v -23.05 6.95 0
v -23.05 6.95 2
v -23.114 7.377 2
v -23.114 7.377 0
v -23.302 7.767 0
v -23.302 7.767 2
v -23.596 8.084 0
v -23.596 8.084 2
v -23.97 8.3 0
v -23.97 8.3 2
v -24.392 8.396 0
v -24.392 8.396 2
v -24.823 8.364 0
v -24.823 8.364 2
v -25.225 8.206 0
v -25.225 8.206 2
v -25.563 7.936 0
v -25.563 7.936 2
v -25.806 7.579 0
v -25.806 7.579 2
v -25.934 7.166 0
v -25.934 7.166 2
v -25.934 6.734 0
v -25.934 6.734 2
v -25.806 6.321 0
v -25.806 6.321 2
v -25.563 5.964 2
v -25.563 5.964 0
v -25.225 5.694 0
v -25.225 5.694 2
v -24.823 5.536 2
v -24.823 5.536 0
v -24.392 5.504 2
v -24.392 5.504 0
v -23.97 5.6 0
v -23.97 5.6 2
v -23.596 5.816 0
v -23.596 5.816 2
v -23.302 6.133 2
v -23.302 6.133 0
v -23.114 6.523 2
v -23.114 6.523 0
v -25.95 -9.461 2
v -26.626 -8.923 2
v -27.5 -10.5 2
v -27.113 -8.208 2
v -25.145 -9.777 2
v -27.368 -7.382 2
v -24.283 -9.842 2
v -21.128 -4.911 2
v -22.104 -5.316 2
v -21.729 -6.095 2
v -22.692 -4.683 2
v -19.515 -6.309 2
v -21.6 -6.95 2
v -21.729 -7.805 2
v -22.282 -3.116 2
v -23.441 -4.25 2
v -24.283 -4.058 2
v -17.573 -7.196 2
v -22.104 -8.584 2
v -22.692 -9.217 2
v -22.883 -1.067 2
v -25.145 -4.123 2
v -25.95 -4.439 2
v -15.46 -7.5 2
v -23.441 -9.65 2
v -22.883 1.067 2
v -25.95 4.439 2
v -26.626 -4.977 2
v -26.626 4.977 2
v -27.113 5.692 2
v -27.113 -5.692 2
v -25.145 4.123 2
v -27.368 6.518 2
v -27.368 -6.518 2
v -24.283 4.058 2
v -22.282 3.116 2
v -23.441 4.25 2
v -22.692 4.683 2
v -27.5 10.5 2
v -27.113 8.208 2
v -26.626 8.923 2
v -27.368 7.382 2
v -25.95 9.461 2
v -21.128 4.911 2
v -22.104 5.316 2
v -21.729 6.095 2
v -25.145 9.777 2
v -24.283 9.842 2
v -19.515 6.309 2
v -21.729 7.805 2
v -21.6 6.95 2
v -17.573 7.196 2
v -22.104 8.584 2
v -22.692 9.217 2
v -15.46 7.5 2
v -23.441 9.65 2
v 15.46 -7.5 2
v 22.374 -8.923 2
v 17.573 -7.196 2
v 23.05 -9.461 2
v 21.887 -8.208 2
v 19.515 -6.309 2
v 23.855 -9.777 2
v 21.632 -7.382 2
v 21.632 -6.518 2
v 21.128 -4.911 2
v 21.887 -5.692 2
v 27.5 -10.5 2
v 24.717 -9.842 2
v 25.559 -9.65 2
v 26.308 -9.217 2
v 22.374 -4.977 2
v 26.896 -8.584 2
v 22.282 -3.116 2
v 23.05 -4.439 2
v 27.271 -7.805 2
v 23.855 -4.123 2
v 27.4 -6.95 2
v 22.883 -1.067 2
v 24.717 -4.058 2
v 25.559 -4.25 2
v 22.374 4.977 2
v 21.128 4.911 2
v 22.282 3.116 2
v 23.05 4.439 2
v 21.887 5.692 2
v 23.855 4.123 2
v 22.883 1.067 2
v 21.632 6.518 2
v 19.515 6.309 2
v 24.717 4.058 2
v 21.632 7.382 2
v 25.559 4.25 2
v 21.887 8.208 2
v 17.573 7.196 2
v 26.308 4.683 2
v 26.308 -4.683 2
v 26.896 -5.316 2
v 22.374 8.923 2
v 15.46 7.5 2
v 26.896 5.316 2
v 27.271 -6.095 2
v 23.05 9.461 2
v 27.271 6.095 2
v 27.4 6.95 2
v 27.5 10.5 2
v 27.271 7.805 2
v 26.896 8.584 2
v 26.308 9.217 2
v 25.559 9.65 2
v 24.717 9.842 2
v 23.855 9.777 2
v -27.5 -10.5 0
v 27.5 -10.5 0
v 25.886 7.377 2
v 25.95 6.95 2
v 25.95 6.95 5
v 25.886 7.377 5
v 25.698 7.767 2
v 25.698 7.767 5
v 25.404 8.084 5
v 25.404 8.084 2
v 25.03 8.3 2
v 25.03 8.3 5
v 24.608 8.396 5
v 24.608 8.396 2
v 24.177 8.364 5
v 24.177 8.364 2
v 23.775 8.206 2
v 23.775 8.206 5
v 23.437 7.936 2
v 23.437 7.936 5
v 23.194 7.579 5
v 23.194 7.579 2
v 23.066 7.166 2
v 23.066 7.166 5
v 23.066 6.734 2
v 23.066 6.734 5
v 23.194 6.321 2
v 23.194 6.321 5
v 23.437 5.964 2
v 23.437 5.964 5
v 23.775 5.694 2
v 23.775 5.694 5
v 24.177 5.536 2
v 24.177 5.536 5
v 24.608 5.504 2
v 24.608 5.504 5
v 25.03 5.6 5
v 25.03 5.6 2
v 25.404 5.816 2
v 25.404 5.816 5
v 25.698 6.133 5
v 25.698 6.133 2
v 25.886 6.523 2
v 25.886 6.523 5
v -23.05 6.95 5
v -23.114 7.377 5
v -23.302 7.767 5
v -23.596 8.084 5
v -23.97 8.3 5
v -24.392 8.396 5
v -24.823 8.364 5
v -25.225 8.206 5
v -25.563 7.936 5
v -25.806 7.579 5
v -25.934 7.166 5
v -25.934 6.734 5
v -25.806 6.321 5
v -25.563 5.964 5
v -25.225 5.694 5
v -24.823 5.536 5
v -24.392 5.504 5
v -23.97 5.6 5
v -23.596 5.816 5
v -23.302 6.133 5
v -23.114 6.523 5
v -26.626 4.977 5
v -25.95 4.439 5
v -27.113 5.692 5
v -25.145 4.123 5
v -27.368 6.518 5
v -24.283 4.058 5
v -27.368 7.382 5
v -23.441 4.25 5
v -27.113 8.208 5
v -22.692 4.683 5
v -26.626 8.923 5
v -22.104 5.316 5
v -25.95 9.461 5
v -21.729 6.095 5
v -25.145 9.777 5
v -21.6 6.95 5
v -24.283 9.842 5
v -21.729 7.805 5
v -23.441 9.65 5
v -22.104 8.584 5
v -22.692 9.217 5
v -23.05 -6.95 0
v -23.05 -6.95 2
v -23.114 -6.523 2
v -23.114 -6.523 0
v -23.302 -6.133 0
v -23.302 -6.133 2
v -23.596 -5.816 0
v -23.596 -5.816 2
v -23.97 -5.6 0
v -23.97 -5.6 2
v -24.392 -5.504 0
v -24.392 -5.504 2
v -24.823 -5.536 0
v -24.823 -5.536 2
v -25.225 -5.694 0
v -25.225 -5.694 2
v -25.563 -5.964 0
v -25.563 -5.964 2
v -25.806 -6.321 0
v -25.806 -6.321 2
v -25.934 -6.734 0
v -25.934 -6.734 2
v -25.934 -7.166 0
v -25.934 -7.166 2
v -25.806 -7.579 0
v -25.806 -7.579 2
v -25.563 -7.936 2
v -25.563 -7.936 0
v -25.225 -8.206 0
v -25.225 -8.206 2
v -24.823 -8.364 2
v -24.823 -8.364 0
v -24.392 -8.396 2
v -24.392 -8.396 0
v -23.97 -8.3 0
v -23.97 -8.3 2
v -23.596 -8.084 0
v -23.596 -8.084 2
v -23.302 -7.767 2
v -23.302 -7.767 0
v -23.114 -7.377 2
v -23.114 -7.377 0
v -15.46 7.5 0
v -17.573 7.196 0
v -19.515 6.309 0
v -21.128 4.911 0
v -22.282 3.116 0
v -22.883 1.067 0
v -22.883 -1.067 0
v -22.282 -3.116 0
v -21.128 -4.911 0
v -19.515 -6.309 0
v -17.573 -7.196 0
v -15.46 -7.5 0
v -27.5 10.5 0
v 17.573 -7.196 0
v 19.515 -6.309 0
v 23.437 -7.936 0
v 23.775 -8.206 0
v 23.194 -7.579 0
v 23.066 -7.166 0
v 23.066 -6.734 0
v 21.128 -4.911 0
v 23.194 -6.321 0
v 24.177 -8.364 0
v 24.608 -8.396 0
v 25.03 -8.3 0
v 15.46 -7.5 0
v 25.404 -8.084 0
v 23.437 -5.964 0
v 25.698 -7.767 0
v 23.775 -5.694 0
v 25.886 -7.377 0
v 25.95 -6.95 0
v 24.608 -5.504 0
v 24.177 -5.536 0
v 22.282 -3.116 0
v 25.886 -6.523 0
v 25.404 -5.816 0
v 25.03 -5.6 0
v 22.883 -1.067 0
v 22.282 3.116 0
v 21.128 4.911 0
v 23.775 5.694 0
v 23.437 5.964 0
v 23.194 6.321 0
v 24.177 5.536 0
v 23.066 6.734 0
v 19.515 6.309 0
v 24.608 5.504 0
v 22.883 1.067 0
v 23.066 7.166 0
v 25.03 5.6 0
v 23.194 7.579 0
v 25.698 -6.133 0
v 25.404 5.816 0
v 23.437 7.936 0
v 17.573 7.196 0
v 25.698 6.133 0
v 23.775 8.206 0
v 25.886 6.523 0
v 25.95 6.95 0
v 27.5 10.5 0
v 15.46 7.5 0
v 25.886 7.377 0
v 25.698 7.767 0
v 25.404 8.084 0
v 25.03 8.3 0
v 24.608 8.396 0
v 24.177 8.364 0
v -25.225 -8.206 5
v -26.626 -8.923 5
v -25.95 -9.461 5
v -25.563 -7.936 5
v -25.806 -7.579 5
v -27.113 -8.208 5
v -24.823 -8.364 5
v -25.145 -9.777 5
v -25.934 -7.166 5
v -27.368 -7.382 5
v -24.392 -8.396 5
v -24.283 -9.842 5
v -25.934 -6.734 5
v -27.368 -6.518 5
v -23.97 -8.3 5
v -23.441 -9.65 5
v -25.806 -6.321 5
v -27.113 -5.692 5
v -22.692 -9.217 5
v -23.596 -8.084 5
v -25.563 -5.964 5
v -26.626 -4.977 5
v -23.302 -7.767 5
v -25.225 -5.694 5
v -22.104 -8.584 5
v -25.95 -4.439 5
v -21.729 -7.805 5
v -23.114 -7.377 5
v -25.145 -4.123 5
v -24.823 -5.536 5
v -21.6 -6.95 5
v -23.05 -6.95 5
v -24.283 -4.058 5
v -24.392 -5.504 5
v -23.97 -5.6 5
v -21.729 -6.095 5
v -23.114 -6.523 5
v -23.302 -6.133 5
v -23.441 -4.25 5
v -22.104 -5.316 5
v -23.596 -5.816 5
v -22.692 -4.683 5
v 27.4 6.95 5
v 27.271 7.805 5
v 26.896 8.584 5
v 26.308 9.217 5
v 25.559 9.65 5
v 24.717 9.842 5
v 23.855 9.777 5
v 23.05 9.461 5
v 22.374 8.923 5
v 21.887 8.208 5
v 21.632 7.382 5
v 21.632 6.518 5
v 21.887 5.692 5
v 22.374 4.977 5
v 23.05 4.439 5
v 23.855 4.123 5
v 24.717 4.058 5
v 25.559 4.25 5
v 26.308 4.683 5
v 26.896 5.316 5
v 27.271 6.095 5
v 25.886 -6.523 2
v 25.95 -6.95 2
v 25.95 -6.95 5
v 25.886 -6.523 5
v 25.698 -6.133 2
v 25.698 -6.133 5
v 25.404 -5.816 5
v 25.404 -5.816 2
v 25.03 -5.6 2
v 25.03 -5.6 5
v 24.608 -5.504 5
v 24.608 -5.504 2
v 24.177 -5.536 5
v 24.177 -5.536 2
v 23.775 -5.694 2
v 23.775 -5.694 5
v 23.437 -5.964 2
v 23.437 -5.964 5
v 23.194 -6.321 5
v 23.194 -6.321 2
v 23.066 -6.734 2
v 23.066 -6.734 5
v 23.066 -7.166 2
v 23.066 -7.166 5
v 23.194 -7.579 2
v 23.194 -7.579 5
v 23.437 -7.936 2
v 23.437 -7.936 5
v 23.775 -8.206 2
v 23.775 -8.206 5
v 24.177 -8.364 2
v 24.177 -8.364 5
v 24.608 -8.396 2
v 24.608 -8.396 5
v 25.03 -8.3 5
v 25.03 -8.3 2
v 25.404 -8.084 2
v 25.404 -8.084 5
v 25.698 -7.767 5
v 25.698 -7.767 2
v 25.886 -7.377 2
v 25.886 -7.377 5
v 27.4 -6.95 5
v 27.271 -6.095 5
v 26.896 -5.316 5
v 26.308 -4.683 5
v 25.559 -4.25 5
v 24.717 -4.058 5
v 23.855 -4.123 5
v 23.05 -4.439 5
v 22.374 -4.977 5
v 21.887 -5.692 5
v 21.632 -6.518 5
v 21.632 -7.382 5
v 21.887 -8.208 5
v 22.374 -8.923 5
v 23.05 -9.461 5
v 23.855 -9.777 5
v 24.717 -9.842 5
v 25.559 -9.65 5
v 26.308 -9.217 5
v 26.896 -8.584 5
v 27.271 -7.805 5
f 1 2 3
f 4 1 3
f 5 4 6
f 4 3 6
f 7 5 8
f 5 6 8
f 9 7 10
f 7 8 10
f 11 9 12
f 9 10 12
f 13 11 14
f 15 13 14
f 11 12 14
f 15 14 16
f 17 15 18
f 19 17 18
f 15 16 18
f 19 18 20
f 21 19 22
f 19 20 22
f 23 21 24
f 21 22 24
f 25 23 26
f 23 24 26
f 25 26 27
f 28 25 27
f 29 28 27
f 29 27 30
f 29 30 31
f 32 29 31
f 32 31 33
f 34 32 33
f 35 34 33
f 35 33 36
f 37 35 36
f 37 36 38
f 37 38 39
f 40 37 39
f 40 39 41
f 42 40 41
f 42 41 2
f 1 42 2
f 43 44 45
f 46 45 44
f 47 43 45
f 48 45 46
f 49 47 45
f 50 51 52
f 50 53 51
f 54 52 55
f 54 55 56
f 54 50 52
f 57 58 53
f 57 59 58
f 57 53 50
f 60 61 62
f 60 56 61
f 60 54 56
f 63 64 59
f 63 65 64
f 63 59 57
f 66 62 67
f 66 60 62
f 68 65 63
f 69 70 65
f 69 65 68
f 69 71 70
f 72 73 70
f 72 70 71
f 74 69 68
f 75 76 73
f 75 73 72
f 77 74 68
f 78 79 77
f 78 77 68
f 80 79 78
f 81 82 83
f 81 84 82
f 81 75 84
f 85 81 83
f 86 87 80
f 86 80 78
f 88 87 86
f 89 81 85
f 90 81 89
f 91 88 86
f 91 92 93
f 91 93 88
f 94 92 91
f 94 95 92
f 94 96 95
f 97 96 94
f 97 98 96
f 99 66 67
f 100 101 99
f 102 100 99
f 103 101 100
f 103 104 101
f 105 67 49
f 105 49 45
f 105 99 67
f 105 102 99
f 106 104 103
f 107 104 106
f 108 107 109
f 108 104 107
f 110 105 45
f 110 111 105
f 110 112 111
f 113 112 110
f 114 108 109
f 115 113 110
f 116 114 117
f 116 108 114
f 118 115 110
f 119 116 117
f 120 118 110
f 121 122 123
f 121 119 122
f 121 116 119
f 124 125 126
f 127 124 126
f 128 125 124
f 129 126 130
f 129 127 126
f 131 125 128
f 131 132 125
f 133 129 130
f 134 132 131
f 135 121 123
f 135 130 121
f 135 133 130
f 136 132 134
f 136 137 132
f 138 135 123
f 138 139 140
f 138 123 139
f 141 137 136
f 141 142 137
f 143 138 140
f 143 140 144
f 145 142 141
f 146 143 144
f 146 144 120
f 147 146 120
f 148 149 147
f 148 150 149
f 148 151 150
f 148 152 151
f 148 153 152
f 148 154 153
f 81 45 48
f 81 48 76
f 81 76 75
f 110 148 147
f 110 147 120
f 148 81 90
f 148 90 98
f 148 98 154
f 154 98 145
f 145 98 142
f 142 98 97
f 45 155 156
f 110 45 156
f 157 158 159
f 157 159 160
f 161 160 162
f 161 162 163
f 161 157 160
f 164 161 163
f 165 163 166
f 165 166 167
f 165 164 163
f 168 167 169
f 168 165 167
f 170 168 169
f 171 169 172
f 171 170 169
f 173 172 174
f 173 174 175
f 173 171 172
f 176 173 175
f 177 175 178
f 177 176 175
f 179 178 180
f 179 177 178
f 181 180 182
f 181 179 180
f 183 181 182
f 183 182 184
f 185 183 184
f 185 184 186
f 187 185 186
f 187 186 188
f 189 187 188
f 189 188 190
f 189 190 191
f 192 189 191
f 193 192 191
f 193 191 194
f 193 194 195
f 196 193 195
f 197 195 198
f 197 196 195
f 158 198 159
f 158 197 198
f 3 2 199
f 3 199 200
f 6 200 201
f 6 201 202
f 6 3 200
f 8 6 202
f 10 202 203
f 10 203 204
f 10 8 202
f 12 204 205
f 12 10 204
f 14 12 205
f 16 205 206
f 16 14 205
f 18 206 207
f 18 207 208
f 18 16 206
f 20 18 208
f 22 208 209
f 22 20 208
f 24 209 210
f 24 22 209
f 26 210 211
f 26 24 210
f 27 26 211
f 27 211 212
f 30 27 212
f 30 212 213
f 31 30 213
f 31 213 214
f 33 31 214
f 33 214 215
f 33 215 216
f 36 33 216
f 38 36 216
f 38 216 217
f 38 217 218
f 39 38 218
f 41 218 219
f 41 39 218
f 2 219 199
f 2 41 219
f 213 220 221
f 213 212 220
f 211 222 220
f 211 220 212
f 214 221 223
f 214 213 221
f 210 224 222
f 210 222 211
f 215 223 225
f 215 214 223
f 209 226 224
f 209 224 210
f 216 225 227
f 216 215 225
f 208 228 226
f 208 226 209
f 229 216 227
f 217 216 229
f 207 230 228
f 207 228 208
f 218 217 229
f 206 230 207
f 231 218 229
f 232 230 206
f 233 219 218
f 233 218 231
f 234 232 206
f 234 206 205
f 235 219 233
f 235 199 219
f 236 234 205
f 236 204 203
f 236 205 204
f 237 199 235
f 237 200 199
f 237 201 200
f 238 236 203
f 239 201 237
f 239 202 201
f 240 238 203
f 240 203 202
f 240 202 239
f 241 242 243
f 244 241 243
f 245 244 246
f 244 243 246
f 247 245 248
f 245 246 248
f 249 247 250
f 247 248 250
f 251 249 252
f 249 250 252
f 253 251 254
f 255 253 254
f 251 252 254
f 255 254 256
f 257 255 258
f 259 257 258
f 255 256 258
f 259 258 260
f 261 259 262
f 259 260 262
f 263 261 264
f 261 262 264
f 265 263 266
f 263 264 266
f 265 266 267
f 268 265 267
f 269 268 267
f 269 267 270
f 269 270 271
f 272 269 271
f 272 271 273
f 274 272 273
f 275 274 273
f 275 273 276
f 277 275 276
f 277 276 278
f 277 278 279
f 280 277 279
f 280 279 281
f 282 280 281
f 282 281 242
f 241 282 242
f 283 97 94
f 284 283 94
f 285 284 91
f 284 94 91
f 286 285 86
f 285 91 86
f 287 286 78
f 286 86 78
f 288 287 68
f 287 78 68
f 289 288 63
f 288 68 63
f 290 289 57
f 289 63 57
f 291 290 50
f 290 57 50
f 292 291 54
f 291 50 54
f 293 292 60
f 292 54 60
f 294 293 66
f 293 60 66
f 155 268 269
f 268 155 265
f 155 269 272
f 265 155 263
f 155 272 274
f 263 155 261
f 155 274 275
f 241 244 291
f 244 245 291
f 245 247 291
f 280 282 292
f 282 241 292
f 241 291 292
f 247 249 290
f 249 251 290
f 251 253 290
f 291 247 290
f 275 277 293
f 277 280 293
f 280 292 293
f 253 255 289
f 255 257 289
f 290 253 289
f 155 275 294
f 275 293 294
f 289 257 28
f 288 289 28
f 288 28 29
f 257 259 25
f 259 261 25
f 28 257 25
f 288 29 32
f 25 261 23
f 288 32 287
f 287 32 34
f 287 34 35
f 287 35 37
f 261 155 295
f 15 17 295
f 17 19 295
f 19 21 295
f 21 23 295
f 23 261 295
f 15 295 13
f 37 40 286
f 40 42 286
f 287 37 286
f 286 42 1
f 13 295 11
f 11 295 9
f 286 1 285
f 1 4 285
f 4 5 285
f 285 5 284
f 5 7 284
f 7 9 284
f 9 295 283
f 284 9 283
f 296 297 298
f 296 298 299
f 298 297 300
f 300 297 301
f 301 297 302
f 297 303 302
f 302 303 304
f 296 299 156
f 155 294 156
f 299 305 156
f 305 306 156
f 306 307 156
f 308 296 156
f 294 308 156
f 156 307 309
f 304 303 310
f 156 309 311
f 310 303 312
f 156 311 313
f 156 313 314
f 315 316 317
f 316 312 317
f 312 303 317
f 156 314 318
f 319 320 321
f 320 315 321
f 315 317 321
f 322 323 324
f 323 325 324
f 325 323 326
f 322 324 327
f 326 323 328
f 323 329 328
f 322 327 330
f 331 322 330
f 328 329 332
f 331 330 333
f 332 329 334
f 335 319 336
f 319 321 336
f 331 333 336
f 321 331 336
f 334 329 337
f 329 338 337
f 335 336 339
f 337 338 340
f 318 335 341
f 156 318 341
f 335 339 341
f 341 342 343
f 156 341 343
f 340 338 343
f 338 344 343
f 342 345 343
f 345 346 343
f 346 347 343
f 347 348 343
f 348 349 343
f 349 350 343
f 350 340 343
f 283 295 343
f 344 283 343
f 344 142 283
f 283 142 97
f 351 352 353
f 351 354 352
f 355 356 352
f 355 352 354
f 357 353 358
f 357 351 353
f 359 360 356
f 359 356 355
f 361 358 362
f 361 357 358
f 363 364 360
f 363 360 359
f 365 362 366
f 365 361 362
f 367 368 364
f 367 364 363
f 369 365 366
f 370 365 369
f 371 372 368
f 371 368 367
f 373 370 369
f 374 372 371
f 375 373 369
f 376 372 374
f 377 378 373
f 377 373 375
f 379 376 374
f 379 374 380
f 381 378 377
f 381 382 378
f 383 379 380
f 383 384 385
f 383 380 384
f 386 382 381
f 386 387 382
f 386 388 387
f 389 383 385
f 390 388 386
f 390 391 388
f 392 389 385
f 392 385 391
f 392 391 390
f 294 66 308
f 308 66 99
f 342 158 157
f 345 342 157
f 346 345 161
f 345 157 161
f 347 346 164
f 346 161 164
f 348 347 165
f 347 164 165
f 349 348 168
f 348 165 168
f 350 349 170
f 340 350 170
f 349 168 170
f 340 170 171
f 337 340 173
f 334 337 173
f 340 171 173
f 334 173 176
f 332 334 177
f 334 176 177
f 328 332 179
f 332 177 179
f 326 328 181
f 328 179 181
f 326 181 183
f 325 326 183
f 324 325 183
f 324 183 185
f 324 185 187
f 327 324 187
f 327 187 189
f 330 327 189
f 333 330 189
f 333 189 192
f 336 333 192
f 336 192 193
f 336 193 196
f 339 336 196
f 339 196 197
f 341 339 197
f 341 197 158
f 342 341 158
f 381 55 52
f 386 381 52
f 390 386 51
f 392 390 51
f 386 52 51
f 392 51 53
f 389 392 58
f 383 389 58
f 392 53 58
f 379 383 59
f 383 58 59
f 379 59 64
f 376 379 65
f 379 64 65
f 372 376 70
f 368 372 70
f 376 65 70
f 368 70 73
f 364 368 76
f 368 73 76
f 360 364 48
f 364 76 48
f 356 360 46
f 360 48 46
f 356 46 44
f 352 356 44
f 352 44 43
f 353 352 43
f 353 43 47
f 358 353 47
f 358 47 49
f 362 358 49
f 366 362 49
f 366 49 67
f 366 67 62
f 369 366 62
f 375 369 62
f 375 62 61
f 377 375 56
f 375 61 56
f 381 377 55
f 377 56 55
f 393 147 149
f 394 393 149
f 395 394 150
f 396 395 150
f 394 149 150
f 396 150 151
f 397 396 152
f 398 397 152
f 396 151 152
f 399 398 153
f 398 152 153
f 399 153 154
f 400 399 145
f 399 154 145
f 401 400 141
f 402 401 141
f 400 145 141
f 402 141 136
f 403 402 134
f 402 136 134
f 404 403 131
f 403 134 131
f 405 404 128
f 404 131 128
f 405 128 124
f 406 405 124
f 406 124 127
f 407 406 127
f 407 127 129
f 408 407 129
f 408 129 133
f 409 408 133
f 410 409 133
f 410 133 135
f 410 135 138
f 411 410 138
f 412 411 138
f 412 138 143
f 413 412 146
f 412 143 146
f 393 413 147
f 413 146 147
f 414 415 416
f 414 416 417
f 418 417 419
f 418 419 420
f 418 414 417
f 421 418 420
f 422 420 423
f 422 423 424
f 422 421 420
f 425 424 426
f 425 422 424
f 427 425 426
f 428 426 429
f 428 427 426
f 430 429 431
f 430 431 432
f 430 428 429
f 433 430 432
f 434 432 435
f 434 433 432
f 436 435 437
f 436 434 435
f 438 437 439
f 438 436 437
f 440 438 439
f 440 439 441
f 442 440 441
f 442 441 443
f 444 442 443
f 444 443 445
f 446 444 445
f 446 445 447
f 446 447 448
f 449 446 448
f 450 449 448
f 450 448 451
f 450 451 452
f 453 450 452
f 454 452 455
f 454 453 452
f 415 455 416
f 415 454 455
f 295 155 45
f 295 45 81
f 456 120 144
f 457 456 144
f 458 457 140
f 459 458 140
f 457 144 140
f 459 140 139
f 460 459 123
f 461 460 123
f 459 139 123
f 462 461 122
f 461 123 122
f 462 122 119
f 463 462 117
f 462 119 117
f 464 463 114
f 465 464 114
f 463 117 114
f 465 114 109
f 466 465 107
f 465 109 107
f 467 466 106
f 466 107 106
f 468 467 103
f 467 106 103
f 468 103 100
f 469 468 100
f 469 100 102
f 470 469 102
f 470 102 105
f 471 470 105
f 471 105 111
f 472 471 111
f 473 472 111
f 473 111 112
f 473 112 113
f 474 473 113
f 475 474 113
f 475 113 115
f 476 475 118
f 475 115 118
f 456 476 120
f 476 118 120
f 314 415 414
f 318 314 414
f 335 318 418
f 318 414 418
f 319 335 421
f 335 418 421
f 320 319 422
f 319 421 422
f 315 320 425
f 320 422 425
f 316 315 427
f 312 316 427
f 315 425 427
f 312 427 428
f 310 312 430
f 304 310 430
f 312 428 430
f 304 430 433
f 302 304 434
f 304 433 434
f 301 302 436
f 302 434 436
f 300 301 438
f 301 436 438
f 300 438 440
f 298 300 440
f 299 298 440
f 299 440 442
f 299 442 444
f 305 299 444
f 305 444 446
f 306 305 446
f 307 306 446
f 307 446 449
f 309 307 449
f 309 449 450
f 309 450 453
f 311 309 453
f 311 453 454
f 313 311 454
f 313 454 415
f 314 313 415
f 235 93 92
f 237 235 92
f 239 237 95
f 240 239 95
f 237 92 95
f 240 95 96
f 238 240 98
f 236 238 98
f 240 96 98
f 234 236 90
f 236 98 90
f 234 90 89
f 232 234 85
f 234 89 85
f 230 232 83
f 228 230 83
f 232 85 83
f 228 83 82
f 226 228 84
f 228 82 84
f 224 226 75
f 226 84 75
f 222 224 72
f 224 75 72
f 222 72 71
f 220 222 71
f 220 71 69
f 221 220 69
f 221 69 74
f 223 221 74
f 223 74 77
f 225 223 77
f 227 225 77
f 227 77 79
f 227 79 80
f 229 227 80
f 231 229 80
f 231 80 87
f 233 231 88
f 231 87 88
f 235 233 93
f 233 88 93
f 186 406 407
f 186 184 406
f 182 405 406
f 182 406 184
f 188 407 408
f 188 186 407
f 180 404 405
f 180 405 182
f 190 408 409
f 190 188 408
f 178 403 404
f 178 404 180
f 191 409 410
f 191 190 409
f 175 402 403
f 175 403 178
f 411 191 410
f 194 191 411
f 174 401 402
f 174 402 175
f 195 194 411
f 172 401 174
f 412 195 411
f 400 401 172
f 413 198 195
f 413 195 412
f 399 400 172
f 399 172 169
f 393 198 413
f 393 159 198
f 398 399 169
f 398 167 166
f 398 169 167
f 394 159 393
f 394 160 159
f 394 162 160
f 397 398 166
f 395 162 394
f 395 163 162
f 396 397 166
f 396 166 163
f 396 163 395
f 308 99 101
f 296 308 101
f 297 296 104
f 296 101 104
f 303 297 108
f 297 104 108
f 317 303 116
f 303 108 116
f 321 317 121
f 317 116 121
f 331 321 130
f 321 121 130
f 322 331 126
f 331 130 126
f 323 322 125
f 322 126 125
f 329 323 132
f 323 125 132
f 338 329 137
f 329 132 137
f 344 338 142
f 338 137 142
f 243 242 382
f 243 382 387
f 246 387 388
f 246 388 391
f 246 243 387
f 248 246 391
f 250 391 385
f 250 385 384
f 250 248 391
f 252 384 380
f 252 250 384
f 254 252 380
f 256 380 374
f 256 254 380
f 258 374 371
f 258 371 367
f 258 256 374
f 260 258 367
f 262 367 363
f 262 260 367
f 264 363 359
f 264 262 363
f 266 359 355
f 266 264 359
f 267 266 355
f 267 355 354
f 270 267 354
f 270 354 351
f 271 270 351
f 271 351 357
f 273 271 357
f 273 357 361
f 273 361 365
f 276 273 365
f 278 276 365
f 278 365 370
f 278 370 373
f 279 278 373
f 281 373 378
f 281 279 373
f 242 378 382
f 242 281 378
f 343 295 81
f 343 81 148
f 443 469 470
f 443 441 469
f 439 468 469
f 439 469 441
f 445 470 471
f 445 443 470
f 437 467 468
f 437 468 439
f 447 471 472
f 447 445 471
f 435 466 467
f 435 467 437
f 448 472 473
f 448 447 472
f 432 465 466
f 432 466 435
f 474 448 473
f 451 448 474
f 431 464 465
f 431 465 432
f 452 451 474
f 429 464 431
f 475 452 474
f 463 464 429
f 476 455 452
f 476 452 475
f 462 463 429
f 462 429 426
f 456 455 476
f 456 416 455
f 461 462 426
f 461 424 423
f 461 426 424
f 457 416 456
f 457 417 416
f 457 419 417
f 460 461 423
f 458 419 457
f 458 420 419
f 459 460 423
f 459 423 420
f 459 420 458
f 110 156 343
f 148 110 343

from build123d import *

# Parameters (mm, degrees)
SKETCH_W        = 55
SKETCH_H        = 21
PAD_DEPTH       = 2
SKETCH001_R     = 1.45
POCKET_DEPTH    = 2.001
SKETCH002_R     = 2.9
SKETCH002_R_2   = 1.45
PAD001_DEPTH    = 3
POCKET001_DEPTH = 2.001


with BuildPart() as part:
    # Sketch → Pad (new body)
    with BuildSketch(Plane.XY):
        Rectangle(SKETCH_W, SKETCH_H)
    extrude(amount=PAD_DEPTH)

    # Sketch001 (on Face6 of Pad) → Pocket (cut, through all)
    with BuildSketch(Plane.XY.offset(2)):
        with Locations((-24.5, 6.95)):
            Circle(SKETCH001_R)
        with Locations((24.5, 6.95)):
            Circle(SKETCH001_R)
        with Locations((24.5, -6.95)):
            Circle(SKETCH001_R)
        with Locations((-24.5, -6.95)):
            Circle(SKETCH001_R)
    extrude(amount=-POCKET_DEPTH, mode=Mode.SUBTRACT)

    # Sketch002 (on Face5 of Pocket) → Pad001 (join)
    with BuildSketch(Plane.XY.offset(2)):
        with Locations((-24.5, 6.95)):
            Circle(SKETCH002_R)
        with Locations((-24.5, 6.95)):
            Circle(SKETCH002_R_2, mode=Mode.SUBTRACT)
        with Locations((24.5, 6.95)):
            Circle(SKETCH002_R)
        with Locations((24.5, 6.95)):
            Circle(SKETCH002_R_2, mode=Mode.SUBTRACT)
        with Locations((24.5, -6.95)):
            Circle(SKETCH002_R)
        with Locations((24.5, -6.95)):
            Circle(SKETCH002_R_2, mode=Mode.SUBTRACT)
        with Locations((-24.5, -6.95)):
            Circle(SKETCH002_R)
        with Locations((-24.5, -6.95)):
            Circle(SKETCH002_R_2, mode=Mode.SUBTRACT)
    extrude(amount=PAD001_DEPTH)

    # Sketch003 (on Face5 of Pad001) → Pocket001 (cut, through all)
    with BuildSketch(Plane.XY.offset(2)):
        with BuildLine():
            ThreePointArc((-15.459811, 7.5), (-22.959811, 0), (-15.459811, -7.5))
            Line((-15.459811, -7.5), (15.459811, -7.5))
            ThreePointArc((15.459811, -7.5), (22.959811, 0), (15.459811, 7.5))
            Line((15.459811, 7.5), (-15.459811, 7.5))
        make_face()
    extrude(amount=-POCKET001_DEPTH, mode=Mode.SUBTRACT)


solid = part.part
